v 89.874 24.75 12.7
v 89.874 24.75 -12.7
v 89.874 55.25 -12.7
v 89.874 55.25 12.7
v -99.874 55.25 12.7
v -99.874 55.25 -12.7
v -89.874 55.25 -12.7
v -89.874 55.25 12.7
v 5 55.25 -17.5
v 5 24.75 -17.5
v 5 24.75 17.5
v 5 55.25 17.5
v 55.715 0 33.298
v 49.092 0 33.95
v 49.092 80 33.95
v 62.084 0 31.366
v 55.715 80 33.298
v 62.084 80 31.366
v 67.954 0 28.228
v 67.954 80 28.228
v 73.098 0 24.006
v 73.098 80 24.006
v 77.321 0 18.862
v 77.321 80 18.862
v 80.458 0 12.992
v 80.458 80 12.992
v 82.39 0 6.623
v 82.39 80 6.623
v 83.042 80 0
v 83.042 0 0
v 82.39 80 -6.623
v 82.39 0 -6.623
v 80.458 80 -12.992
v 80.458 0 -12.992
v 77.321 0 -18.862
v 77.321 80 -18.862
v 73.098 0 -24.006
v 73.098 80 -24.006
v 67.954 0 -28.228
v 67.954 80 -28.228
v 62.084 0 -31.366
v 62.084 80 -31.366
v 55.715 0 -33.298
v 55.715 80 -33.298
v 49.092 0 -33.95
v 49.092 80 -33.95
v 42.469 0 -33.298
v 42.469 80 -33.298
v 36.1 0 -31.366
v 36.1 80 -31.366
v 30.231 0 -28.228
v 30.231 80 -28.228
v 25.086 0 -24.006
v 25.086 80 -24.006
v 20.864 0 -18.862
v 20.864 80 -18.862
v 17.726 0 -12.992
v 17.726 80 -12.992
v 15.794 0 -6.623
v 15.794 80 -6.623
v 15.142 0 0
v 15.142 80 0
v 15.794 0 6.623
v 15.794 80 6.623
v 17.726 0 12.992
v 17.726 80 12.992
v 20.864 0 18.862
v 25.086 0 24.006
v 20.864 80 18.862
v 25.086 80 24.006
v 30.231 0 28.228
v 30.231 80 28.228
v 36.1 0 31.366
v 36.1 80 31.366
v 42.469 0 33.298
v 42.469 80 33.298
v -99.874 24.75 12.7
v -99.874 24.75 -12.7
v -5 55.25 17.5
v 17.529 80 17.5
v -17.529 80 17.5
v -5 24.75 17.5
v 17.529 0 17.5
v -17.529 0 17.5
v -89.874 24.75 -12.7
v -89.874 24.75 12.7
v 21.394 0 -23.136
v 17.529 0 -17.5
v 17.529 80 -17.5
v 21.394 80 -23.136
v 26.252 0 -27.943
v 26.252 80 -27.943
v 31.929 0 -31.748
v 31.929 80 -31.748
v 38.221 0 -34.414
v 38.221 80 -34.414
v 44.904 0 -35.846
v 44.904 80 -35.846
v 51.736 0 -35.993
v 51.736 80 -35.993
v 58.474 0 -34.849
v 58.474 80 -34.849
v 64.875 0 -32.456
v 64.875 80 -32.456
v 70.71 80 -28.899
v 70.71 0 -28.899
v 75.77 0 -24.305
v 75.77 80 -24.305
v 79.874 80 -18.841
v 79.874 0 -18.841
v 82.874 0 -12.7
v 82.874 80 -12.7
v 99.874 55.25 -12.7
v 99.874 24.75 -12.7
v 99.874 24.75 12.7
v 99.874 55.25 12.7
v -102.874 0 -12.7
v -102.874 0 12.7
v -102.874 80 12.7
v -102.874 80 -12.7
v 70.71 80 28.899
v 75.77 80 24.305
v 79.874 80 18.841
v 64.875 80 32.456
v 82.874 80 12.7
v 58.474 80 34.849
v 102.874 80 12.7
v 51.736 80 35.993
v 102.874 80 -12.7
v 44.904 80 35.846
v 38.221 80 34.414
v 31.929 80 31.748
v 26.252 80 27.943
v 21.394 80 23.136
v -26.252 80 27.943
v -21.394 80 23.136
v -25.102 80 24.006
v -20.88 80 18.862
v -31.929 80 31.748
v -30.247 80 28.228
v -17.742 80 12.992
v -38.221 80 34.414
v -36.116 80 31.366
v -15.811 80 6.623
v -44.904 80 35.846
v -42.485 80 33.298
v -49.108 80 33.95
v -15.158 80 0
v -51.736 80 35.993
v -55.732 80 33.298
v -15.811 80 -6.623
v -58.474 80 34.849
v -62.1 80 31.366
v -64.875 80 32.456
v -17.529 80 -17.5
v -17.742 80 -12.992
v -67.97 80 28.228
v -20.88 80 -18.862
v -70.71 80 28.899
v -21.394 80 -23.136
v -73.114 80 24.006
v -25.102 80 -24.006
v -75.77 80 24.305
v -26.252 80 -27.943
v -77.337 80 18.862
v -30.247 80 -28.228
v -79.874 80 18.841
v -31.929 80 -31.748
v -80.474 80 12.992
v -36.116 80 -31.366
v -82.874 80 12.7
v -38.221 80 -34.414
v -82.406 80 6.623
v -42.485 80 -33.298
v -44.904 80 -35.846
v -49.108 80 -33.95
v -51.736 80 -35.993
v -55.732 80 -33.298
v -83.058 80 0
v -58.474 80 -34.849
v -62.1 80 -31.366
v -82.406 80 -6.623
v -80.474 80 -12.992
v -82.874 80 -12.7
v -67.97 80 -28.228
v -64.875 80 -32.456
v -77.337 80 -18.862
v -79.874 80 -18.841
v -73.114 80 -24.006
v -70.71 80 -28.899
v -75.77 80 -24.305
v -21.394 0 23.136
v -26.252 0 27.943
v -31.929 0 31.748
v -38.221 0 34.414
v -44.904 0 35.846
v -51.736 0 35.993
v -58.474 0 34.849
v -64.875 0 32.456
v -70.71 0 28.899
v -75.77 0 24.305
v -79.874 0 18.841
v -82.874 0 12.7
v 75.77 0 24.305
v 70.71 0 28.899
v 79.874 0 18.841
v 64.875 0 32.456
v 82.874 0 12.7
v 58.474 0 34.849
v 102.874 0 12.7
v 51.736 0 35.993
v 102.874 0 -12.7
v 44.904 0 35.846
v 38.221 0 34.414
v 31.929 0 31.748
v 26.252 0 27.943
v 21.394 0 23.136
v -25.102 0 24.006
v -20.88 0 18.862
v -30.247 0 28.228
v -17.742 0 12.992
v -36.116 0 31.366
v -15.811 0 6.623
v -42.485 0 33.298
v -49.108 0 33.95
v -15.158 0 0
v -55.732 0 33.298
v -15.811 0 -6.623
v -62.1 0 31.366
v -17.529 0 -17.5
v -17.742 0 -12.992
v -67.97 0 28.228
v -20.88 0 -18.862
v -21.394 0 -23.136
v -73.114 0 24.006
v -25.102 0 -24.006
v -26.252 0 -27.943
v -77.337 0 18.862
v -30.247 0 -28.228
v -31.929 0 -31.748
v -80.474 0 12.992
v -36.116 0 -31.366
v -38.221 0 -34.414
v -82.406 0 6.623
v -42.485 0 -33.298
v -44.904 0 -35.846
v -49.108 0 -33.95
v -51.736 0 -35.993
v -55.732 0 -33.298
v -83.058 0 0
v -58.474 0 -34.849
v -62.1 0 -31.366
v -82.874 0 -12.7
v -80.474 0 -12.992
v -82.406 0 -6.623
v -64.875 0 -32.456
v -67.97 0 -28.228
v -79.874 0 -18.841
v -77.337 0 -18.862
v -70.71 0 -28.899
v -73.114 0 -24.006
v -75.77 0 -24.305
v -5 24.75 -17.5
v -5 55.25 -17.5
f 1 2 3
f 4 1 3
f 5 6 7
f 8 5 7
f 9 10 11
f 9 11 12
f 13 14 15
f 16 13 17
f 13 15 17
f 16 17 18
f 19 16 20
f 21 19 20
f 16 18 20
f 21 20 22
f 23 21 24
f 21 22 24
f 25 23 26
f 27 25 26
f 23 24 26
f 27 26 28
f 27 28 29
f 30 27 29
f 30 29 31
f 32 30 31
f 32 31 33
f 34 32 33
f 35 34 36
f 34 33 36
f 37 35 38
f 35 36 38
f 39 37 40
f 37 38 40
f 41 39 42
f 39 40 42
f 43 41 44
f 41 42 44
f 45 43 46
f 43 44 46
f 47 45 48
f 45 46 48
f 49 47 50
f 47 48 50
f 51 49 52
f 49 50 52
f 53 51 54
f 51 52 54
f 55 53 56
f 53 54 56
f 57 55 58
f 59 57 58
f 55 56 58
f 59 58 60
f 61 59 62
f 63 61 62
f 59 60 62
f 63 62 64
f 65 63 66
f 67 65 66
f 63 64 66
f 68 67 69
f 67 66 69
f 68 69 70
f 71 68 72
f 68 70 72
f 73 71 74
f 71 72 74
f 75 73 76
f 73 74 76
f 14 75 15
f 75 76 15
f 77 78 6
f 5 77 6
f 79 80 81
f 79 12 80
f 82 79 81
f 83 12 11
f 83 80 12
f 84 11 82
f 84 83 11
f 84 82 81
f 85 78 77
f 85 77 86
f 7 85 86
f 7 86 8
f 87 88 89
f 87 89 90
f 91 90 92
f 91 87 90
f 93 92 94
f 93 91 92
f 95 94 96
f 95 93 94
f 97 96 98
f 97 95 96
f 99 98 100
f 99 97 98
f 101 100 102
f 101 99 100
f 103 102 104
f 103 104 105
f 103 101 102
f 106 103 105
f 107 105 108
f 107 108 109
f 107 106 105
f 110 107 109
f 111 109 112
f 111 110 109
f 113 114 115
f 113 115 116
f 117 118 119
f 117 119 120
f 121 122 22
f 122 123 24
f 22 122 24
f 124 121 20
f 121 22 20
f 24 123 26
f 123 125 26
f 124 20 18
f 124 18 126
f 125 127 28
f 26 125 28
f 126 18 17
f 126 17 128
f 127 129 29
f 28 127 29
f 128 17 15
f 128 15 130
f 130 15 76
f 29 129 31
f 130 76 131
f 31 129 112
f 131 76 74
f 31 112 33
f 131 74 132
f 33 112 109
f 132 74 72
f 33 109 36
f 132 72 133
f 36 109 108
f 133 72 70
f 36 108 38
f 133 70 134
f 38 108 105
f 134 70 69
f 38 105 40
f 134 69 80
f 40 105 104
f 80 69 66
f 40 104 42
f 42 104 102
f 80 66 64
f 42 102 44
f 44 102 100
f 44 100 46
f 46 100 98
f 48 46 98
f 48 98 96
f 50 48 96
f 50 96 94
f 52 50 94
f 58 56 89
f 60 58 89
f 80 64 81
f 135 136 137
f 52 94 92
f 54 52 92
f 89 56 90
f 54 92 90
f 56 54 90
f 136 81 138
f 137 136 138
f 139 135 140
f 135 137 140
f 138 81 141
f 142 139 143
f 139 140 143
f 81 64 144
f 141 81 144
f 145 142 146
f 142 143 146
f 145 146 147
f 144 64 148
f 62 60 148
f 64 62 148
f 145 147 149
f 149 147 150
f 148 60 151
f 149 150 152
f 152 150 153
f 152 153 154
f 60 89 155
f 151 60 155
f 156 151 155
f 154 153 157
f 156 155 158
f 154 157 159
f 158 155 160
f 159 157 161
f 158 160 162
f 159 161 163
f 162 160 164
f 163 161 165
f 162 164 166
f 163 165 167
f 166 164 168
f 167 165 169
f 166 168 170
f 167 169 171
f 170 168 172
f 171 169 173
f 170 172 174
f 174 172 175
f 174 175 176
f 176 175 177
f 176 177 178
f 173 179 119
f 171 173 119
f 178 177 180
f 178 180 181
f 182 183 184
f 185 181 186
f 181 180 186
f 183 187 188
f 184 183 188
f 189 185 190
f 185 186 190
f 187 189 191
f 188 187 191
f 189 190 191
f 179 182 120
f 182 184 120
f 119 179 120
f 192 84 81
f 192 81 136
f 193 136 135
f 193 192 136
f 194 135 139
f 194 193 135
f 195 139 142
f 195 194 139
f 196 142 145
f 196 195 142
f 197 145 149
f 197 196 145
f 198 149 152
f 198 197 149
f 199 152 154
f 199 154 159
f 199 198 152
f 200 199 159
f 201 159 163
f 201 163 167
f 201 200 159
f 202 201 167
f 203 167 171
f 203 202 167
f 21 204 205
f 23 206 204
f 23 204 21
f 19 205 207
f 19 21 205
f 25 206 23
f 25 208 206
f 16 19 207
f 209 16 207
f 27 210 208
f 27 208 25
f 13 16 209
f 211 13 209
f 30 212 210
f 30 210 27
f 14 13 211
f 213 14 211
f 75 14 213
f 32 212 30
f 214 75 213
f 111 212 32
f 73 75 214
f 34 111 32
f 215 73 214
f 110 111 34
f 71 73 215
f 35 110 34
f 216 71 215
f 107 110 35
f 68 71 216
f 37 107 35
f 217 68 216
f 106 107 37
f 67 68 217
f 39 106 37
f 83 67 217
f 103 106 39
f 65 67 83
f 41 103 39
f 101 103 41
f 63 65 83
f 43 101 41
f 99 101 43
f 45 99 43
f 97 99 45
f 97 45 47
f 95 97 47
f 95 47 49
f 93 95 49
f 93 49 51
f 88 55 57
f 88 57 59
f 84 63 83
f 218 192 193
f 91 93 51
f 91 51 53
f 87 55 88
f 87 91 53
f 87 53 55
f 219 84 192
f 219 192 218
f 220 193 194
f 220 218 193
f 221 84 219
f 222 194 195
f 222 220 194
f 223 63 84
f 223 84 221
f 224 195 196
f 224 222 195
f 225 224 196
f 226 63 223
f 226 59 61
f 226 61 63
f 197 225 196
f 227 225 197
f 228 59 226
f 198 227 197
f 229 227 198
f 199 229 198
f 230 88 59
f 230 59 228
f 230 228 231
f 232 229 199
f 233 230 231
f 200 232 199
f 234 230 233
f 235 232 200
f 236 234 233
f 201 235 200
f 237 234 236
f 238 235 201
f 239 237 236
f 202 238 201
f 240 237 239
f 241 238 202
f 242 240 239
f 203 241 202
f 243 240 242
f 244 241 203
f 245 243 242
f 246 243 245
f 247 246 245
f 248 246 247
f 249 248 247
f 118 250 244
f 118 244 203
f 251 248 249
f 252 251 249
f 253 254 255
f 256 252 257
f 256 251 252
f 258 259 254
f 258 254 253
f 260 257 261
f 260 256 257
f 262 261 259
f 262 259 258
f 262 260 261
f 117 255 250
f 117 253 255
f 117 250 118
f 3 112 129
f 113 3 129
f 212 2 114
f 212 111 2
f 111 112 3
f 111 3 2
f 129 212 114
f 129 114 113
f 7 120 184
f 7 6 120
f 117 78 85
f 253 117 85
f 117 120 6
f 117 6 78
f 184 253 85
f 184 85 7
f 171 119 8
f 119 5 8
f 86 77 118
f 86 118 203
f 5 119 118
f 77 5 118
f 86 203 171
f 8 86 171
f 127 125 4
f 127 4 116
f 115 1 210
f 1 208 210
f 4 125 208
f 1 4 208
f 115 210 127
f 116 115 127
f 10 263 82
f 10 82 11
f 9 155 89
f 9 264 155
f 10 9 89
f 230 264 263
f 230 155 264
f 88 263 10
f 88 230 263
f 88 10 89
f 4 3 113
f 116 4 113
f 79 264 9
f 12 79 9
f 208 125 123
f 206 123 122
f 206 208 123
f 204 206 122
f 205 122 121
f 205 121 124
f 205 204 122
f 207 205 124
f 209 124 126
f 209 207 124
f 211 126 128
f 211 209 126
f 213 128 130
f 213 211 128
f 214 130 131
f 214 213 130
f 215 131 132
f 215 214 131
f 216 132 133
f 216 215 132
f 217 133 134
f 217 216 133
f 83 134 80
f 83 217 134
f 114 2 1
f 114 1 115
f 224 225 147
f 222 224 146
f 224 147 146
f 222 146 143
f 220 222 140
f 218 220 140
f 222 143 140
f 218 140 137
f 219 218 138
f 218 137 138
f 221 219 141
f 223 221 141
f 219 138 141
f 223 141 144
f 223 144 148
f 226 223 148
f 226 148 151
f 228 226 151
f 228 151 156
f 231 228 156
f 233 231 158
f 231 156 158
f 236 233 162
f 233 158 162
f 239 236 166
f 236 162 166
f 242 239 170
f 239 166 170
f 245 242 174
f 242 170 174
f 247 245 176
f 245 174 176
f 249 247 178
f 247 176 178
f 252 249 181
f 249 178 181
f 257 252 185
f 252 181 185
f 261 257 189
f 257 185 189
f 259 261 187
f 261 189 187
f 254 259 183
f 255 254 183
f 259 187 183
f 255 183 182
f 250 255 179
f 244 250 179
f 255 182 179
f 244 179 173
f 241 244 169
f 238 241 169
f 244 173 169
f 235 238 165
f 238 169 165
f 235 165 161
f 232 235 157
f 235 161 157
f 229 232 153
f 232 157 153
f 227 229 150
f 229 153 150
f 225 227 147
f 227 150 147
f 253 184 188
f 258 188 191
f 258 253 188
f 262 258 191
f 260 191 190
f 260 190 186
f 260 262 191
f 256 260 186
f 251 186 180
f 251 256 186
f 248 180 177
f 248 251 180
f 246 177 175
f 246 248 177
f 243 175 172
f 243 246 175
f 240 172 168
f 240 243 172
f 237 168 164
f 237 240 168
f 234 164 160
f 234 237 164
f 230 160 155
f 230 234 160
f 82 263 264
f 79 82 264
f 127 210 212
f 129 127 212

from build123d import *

# Parameters (mm, degrees)
SKETCH1_W               = 20
SKETCH1_H               = 25.4
BOSS_EXTRUDE1_DEPTH     = 80
SKETCH2_R               = 33.95
CUT_EXTRUDE1_DEPTH      = 80
CUT_EXTRUDE3_DEPTH      = 140.152703783
CUT_EXTRUDE3_DEPTH_BACK = 140.152703783
SKETCH3_W               = 10
SKETCH3_H               = 30.5


with BuildPart() as part:
    # Sketch1 → Boss-Extrude1 (new body)
    with BuildSketch(Plane(origin=(0, 0, 0), x_dir=(1, 0, 0), z_dir=(0, 1, 0))):
        with BuildLine():
            Line((-17.528898419, 17.5), (17.528898419, 17.5))
            ThreePointArc((17.528898419, 17.5), (85.182138113, 0), (17.528898419, -17.5))
            Line((17.528898419, -17.5), (-17.528898419, -17.5))
            ThreePointArc((-17.528898419, -17.5), (-85.182138113, 0), (-17.528898419, 17.5))
        make_face()
        with Locations((-92.873761816, 0)):
            Rectangle(SKETCH1_W, SKETCH1_H)
        with Locations((92.873761816, 0)):
            Rectangle(SKETCH1_W, SKETCH1_H)
    extrude(amount=BOSS_EXTRUDE1_DEPTH)

    # Sketch2 → Cut-Extrude1 (cut)
    with BuildSketch(Plane(origin=(0, 80, 0), x_dir=(1, 0, 0), z_dir=(0, 1, 0))):
        with Locations(Location((-49.108204523, 0, 0), (0, 0, 270))):
            Circle(SKETCH2_R)
        with Locations(Location((49.092138113, 0, 0), (0, 0, 270))):
            Circle(SKETCH2_R)
    extrude(amount=-CUT_EXTRUDE1_DEPTH, mode=Mode.SUBTRACT)

    # Sketch3 → Cut-Extrude3 (cut, two sides: drawn at the far end of the back side and taken through both)
    with BuildSketch(Plane.XY.offset(12.7).offset(-CUT_EXTRUDE3_DEPTH_BACK)):
        with Locations((0, 40)):
            Rectangle(SKETCH3_W, SKETCH3_H)
        with Locations((-94.873761816, 40)):
            Rectangle(SKETCH3_W, SKETCH3_H)
        with Locations((94.873761816, 40)):
            Rectangle(SKETCH3_W, SKETCH3_H)
    extrude(amount=CUT_EXTRUDE3_DEPTH + CUT_EXTRUDE3_DEPTH_BACK, mode=Mode.SUBTRACT)


solid = part.part
